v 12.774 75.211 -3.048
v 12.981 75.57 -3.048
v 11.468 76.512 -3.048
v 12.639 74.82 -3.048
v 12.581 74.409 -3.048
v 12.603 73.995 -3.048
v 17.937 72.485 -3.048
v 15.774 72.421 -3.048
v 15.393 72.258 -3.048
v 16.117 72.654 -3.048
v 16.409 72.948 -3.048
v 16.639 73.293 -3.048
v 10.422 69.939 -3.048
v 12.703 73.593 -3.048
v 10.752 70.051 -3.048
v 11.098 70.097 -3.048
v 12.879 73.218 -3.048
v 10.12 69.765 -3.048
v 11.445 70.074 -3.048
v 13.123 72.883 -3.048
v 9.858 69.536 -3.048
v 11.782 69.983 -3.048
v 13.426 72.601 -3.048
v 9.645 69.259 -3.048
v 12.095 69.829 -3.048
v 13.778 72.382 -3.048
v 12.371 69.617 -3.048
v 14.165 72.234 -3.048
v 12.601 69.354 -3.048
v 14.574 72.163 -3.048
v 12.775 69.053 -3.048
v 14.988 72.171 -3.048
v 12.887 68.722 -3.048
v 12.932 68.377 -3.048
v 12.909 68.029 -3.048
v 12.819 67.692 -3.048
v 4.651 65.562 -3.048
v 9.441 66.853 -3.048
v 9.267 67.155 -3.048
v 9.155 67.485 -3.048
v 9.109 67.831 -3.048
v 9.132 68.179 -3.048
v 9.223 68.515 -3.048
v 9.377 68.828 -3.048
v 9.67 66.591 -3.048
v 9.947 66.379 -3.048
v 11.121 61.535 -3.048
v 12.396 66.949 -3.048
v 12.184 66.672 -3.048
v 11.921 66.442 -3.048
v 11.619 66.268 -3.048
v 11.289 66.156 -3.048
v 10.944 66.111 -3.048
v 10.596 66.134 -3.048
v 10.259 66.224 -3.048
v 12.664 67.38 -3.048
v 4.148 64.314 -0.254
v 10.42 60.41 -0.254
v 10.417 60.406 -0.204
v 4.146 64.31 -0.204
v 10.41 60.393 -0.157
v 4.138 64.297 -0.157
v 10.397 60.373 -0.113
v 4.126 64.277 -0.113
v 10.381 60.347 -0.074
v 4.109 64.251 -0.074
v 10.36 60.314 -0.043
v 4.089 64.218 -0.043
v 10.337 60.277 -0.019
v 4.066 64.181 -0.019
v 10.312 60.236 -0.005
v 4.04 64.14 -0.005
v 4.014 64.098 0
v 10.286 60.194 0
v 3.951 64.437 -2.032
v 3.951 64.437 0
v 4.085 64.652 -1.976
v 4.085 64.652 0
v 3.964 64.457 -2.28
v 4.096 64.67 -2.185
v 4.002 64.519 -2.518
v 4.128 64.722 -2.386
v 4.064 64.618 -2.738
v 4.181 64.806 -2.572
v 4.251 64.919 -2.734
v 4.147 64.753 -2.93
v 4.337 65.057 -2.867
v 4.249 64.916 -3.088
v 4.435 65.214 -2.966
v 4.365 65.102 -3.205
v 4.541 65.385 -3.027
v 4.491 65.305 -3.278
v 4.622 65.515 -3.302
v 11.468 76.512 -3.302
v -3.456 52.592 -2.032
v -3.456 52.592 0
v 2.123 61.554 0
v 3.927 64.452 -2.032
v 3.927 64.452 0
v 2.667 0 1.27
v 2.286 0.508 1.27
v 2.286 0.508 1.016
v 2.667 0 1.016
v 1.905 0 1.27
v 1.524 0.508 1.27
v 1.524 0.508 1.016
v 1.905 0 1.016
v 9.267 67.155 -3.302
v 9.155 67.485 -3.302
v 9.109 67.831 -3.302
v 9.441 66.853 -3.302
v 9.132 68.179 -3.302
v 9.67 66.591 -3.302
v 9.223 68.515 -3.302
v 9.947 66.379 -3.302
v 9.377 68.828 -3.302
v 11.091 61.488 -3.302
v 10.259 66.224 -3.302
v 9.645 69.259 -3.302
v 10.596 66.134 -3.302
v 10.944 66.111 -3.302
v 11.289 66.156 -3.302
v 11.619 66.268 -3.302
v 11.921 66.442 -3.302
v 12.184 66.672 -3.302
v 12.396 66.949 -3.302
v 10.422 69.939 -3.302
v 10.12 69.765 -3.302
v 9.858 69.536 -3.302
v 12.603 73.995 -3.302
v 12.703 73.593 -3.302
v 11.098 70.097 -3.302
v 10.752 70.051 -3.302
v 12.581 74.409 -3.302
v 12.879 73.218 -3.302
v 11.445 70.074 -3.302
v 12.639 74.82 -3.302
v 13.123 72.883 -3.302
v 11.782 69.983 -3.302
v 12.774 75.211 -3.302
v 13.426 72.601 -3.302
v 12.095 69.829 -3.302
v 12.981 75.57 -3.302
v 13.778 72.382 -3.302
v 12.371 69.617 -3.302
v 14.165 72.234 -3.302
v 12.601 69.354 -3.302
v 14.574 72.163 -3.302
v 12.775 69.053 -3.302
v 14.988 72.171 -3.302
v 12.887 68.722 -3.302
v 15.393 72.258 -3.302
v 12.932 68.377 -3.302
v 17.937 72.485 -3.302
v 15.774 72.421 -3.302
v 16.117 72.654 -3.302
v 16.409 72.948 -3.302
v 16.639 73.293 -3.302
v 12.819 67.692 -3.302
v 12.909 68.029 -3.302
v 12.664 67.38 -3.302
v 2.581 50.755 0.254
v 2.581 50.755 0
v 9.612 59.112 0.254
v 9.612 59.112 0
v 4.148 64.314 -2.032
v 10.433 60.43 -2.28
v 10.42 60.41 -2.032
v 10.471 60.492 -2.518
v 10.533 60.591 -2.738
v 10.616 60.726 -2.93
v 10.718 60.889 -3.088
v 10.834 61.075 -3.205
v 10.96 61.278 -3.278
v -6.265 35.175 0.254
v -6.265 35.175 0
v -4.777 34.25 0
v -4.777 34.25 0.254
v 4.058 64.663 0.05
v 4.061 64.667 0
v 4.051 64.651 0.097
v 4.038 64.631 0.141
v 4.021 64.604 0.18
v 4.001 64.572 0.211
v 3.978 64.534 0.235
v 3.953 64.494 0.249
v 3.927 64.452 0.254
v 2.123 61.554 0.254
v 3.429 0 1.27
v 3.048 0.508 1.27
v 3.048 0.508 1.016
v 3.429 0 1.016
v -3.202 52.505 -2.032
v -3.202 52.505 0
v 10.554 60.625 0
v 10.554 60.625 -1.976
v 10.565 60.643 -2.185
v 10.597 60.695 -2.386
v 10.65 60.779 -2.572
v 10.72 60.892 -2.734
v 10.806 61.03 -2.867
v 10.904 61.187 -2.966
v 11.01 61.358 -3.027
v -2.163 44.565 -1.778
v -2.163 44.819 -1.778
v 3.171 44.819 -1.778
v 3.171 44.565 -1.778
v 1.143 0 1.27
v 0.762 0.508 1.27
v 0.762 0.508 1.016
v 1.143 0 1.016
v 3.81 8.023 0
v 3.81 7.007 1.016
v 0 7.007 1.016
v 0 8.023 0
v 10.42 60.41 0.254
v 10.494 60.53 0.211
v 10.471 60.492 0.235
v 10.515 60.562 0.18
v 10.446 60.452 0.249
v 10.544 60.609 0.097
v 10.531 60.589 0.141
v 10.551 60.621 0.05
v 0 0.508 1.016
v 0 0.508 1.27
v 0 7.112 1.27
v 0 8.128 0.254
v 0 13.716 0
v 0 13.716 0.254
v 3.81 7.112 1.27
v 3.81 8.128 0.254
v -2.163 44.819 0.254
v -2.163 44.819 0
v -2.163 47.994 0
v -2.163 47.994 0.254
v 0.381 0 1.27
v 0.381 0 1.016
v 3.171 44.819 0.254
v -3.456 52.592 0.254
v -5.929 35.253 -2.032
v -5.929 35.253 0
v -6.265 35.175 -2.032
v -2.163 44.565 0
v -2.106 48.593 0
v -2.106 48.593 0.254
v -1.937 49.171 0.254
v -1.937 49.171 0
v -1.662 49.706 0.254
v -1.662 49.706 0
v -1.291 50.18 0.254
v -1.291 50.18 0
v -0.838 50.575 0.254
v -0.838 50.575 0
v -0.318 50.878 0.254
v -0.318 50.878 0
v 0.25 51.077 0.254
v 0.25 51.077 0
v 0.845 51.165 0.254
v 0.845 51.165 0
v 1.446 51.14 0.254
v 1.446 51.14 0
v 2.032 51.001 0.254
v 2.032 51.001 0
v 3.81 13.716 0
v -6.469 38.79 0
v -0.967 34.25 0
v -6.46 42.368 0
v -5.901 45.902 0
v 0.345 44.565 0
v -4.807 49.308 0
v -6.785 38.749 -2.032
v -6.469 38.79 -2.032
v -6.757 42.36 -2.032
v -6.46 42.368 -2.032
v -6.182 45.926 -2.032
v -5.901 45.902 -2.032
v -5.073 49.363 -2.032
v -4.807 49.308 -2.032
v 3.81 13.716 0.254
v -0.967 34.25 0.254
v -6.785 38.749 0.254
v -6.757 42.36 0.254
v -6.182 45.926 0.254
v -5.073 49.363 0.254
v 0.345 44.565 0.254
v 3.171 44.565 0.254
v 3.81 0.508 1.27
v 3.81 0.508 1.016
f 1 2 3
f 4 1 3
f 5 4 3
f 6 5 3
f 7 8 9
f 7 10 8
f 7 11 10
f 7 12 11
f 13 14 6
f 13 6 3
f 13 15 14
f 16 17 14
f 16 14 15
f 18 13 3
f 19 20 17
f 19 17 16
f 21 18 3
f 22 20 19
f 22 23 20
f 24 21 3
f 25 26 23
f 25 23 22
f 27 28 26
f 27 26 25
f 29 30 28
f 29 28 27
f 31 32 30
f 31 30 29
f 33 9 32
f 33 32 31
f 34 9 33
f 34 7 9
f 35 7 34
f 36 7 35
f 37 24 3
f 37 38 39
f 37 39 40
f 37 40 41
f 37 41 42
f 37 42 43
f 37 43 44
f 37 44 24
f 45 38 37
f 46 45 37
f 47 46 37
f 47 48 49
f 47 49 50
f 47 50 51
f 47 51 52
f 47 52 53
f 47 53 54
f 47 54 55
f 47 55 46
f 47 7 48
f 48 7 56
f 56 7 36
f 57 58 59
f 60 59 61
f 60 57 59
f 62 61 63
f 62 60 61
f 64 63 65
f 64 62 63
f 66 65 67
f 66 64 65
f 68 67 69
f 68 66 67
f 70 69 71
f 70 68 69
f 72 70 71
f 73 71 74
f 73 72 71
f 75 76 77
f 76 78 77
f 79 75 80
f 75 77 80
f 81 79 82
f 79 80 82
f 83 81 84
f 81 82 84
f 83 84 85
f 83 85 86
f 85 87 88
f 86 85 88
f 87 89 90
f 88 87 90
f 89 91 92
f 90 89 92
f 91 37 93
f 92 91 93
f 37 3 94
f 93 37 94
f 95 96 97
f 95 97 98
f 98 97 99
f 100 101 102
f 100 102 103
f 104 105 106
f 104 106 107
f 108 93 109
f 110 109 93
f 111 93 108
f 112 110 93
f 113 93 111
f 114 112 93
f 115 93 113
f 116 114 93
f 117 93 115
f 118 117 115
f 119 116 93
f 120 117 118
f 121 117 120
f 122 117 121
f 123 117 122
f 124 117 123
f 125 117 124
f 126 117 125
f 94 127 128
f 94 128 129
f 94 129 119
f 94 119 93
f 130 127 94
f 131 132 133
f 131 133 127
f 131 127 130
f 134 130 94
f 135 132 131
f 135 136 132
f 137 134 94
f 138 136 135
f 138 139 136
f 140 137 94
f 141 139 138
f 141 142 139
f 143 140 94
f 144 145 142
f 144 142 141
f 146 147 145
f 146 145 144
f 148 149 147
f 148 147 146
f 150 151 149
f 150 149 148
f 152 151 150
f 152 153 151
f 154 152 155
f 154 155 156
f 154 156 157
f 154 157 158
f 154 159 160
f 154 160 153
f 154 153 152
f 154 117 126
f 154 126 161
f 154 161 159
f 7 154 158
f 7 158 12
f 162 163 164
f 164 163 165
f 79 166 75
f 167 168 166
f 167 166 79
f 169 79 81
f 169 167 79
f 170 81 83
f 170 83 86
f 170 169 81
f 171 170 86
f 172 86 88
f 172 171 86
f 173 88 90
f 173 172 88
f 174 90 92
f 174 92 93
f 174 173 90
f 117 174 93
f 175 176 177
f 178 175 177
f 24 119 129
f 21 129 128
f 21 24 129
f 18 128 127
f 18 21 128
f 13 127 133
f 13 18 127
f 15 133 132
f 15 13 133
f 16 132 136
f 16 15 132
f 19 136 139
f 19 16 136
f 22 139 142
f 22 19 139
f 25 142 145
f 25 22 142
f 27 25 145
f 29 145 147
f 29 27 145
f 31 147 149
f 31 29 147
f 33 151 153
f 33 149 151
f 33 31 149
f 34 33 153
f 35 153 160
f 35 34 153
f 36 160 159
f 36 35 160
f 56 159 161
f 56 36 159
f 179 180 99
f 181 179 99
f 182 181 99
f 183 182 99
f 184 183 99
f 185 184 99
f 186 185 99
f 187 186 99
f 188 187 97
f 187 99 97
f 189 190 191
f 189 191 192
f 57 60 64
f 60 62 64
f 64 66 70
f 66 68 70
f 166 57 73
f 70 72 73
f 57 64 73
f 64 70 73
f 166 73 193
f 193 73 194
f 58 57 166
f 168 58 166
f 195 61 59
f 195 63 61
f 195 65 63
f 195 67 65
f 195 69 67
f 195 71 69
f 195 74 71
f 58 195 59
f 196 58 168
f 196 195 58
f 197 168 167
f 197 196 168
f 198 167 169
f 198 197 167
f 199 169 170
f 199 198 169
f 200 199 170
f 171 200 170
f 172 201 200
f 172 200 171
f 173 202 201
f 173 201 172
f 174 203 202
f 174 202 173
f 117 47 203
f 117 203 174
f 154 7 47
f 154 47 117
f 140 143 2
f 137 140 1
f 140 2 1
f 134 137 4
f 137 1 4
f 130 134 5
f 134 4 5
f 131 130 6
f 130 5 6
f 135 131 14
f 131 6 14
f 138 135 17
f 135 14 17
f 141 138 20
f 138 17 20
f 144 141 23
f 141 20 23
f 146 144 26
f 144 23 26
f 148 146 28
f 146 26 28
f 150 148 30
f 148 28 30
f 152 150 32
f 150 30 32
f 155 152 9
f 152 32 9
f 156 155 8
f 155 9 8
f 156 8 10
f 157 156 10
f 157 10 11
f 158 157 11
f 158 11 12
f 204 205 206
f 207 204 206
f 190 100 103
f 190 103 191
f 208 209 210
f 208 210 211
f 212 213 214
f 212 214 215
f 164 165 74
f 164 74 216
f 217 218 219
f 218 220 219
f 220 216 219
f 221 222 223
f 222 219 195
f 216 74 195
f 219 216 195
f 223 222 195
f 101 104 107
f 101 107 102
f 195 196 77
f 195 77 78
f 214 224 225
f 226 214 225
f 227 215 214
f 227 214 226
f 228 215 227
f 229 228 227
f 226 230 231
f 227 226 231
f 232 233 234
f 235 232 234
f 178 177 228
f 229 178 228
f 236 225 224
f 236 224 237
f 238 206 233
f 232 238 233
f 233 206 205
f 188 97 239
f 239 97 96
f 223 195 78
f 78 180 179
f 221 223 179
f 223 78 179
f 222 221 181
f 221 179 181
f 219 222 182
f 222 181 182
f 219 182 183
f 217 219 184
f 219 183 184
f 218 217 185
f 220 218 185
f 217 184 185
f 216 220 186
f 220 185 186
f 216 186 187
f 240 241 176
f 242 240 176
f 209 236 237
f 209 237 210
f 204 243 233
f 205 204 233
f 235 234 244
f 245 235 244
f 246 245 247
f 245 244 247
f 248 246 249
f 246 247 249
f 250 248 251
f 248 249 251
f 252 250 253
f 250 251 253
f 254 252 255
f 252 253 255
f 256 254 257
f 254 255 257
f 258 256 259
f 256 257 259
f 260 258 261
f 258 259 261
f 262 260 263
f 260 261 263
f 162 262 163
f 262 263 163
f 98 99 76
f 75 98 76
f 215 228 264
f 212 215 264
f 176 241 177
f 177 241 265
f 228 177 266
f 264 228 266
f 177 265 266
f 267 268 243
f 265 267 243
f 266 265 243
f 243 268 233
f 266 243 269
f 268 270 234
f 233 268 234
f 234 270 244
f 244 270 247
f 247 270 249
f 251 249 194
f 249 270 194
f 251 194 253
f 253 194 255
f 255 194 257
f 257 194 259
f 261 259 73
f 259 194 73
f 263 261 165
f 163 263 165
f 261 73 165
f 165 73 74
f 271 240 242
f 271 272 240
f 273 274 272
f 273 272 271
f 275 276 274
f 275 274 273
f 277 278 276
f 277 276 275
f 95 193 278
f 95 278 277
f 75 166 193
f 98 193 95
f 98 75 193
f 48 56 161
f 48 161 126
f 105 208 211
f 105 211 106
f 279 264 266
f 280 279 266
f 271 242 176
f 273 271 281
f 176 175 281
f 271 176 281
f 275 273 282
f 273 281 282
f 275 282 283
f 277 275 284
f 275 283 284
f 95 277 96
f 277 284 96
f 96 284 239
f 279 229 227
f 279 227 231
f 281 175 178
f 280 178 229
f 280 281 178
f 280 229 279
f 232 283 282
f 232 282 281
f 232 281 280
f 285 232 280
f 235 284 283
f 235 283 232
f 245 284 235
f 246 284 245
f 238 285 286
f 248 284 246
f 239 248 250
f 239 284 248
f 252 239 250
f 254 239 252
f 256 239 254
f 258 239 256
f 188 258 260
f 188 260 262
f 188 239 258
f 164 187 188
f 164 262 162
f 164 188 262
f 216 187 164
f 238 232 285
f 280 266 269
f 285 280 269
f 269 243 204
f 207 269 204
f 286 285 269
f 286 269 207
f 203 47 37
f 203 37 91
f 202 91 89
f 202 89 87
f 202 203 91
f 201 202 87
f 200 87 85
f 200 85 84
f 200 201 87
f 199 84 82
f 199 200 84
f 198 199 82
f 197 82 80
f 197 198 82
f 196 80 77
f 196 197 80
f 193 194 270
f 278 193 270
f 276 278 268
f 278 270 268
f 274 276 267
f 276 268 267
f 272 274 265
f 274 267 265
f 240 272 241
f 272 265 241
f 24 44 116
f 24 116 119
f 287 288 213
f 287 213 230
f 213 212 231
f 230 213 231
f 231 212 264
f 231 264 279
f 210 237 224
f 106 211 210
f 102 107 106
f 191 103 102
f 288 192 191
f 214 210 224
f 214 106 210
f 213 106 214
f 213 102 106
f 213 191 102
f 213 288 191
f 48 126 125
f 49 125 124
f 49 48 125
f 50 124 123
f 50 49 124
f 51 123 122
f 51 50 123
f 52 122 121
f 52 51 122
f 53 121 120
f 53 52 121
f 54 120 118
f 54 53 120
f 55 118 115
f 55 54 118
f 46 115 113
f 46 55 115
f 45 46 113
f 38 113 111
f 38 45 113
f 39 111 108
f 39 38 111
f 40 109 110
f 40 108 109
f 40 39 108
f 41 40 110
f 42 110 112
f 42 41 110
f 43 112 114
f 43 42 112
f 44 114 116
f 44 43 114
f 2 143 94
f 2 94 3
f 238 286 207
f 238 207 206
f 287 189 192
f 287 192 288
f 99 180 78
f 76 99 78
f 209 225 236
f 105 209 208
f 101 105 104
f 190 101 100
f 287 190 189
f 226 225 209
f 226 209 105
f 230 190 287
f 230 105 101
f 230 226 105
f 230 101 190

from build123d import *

# Parameters (mm, degrees)
BOSS_EXTRUDE1_DEPTH = 0.254
SKETCH3_W           = 3.81
SKETCH3_H           = 7.112
BOSS_EXTRUDE2_DEPTH = 1.016
BOSS_EXTRUDE3_DEPTH = 3.81
CUT_EXTRUDE1_DEPTH  = 3.81
CUT_EXTRUDE3_DEPTH  = 3.81
SKETCH9_W           = 5.334
SKETCH9_H           = 0.254
BOSS_EXTRUDE4_DEPTH = 2.032
BOSS_EXTRUDE5_DEPTH = 2.032
BOSS_EXTRUDE6_DEPTH = 7.62
SKETCH15_W          = 0.254
SKETCH15_H          = 13.969943058
CUT_EXTRUDE4_DEPTH  = 24.162808673
FILLET1_R           = 0.254
FILLET2_R           = 0.254
SKETCH16_R          = 2.159
CUT_EXTRUDE5_DEPTH  = 7.62
CUT_EXTRUDE6_DEPTH  = 7.62


with BuildPart() as part:
    # Sketch2 → Boss-Extrude1 (new body)
    with BuildSketch(Plane.XY):
        with BuildLine():
            Line((0, 7.62), (0, 0))
            Line((0, 0), (3.81, 0))
            Line((3.81, 0), (3.81, 13.716))
            Line((3.81, 13.716), (-0.967403026, 34.249561414))
            Line((-0.967403026, 34.249561414), (0.377089259, 44.819493706))
            Line((0.377089259, 44.819493706), (-2.162910741, 44.819493706))
            Line((-2.162910741, 44.819493706), (-2.162910741, 47.994493706))
            ThreePointArc((-2.162910741, 47.994493706), (-0.584766227, 50.738701708), (2.580823154, 50.754873928))
            Line((2.580823154, 50.754873928), (9.612257003, 59.112446663))
            Line((9.612257003, 59.112446663), (17.936769995, 72.485209152))
            Line((17.936769995, 72.485209152), (16.427333856, 73.424829575))
            ThreePointArc((16.427333856, 73.424829575), (15.208368205, 71.757285785), (13.146272514, 71.877039345))
            ThreePointArc((13.146272514, 71.877039345), (12.149333877, 73.408865168), (12.684466147, 75.156437899))
            Line((12.684466147, 75.156437899), (11.175030007, 76.096058323))
            Line((11.175030007, 76.096058323), (2.122651116, 61.554028899))
            Line((2.122651116, 61.554028899), (-3.456202303, 52.591981292))
            ThreePointArc((-3.456202303, 52.591981292), (-6.537615376, 44.154125487), (-6.264635755, 35.175372833))
            Line((-6.264635755, 35.175372833), (-4.777403026, 34.249561414))
            Line((-4.777403026, 34.249561414), (0, 13.716))
            Line((0, 13.716), (0, 7.62))
        make_face()
    extrude(amount=BOSS_EXTRUDE1_DEPTH)

    # Sketch3 → Boss-Extrude2 (add)
    with BuildSketch(Plane.XY.offset(0.254)):
        with Locations((1.905, 3.556)):
            Rectangle(SKETCH3_W, SKETCH3_H)
    extrude(amount=BOSS_EXTRUDE2_DEPTH)

    # Sketch4 → Boss-Extrude3 (add)
    with BuildSketch(Plane(origin=(3.81, 0, 0), x_dir=(0, 0, -1), z_dir=(1, 0, 0))):
        Polygon((-1.27, 7.112), (-0.254, 8.128), (-0.254, 7.112), align=None)
    extrude(amount=-BOSS_EXTRUDE3_DEPTH)

    # Sketch5 → Cut-Extrude1 (cut)
    with BuildSketch(Plane(origin=(3.81, 0, 0), x_dir=(0, 0, -1), z_dir=(1, 0, 0))):
        Polygon((0, 0), (-1.016, 0), (-1.016, 7.006789755), (0, 8.022789755), align=None)
    extrude(amount=-CUT_EXTRUDE1_DEPTH, mode=Mode.SUBTRACT)

    # Sketch7 → Cut-Extrude3 (cut)
    with BuildSketch(Plane.XY.offset(1.27)):
        Polygon((0, 0.508), (0.381, 0), (0.762, 0.508), (1.143, 0), (1.524, 0.508), (1.905, 0), (2.286, 0.508), (2.667, 0), (3.048, 0.508), (3.429, 0), (3.81, 0.508), (3.81, 0), (0, 0), align=None)
    extrude(amount=-CUT_EXTRUDE3_DEPTH, mode=Mode.SUBTRACT)

    # Sketch9 → Boss-Extrude4 (add)
    with BuildSketch(Plane.XY.offset(0.254)):
        with Locations((0.504089259, 44.692493706)):
            Rectangle(SKETCH9_W, SKETCH9_H)
    extrude(amount=-BOSS_EXTRUDE4_DEPTH)

    # Sketch10 → Boss-Extrude5 (add)
    with BuildSketch(Plane(origin=(0, 0, 0), x_dir=(-1, 0, 0), z_dir=(0, 0, -1))):
        with BuildLine():
            Line((5.928887496, 35.253489079), (6.264635755, 35.175372833))
            ThreePointArc((6.264635755, 35.175372833), (6.537615376, 44.154125487), (3.456202303, 52.591981292))
            Line((3.456202303, 52.591981292), (-3.926529596, 64.451836675))
            Line((-3.926529596, 64.451836675), (-4.148451246, 64.313690973))
            Line((-4.148451246, 64.313690973), (3.202180271, 52.505402665))
            ThreePointArc((3.202180271, 52.505402665), (6.248425743, 44.145431055), (5.928887496, 35.253489079))
        make_face()
    extrude(amount=BOSS_EXTRUDE5_DEPTH)

    # Sketch13 → Boss-Extrude6 (add)
    with BuildSketch(Plane(origin=(-19.592819025, 12.196483461, 0), x_dir=(0, 0, -1), z_dir=(0.84895171, -0.528470429, 0))):
        with BuildLine():
            Line((0, 56.791551712), (2.032, 56.791551712))
            ThreePointArc((2.032, 56.791551712), (2.930025612, 57.1635261), (3.302, 58.061551712))
            Line((3.302, 58.061551712), (3.302, 71.01549477))
            Line((3.302, 71.01549477), (3.048, 71.01549477))
            Line((3.048, 71.01549477), (3.048, 58.117392676))
            ThreePointArc((3.048, 58.117392676), (2.73406505, 57.359486662), (1.976159036, 57.045551712))
            Line((1.976159036, 57.045551712), (0, 57.045551712))
            Line((0, 57.045551712), (0, 56.791551712))
        make_face()
    extrude(amount=-BOSS_EXTRUDE6_DEPTH)

    # Sketch15 → Cut-Extrude4 (cut, through all)
    with BuildSketch(Plane(origin=(-19.592819025, 12.196483461, 0), x_dir=(0, 0, -1), z_dir=(0.84895171, -0.528470429, 0))):
        with Locations((-0.127, 64.030523241)):
            Rectangle(SKETCH15_W, SKETCH15_H)
    extrude(amount=-CUT_EXTRUDE4_DEPTH, mode=Mode.SUBTRACT)

    # Fillet1
    fillet1_edges = [part.edges().sort_by_distance(p)[0] for p in [
        (7.307414636, 62.646436259, 0.254),
    ]]
    fillet(fillet1_edges, radius=FILLET1_R)

    # Fillet2
    fillet2_edges = [part.edges().sort_by_distance(p)[0] for p in [
        (7.284143972, 62.361729674, 0),
    ]]
    fillet(fillet2_edges, radius=FILLET2_R)

    # Sketch16 → Cut-Extrude5 (cut)
    with BuildSketch(Plane.XY.offset(-3.048)):
        with Locations((14.737858035, 74.315544717)):
            Circle(SKETCH16_R)
    extrude(amount=-CUT_EXTRUDE5_DEPTH, mode=Mode.SUBTRACT)

    # Sketch17 → Cut-Extrude6 (cut)
    with BuildSketch(Plane.XY.offset(-3.048)):
        with BuildLine():
            Line((12.664355285, 67.379861092), (12.395892307, 66.948593623))
            ThreePointArc((12.395892307, 66.948593623), (9.946835744, 66.378777907), (9.377020028, 68.82783447))
            Line((9.377020028, 68.82783447), (9.645483006, 69.259101939))
            ThreePointArc((9.645483006, 69.259101939), (12.094539569, 69.828917655), (12.664355285, 67.379861092))
        make_face()
    extrude(amount=-CUT_EXTRUDE6_DEPTH, mode=Mode.SUBTRACT)


solid = part.part
